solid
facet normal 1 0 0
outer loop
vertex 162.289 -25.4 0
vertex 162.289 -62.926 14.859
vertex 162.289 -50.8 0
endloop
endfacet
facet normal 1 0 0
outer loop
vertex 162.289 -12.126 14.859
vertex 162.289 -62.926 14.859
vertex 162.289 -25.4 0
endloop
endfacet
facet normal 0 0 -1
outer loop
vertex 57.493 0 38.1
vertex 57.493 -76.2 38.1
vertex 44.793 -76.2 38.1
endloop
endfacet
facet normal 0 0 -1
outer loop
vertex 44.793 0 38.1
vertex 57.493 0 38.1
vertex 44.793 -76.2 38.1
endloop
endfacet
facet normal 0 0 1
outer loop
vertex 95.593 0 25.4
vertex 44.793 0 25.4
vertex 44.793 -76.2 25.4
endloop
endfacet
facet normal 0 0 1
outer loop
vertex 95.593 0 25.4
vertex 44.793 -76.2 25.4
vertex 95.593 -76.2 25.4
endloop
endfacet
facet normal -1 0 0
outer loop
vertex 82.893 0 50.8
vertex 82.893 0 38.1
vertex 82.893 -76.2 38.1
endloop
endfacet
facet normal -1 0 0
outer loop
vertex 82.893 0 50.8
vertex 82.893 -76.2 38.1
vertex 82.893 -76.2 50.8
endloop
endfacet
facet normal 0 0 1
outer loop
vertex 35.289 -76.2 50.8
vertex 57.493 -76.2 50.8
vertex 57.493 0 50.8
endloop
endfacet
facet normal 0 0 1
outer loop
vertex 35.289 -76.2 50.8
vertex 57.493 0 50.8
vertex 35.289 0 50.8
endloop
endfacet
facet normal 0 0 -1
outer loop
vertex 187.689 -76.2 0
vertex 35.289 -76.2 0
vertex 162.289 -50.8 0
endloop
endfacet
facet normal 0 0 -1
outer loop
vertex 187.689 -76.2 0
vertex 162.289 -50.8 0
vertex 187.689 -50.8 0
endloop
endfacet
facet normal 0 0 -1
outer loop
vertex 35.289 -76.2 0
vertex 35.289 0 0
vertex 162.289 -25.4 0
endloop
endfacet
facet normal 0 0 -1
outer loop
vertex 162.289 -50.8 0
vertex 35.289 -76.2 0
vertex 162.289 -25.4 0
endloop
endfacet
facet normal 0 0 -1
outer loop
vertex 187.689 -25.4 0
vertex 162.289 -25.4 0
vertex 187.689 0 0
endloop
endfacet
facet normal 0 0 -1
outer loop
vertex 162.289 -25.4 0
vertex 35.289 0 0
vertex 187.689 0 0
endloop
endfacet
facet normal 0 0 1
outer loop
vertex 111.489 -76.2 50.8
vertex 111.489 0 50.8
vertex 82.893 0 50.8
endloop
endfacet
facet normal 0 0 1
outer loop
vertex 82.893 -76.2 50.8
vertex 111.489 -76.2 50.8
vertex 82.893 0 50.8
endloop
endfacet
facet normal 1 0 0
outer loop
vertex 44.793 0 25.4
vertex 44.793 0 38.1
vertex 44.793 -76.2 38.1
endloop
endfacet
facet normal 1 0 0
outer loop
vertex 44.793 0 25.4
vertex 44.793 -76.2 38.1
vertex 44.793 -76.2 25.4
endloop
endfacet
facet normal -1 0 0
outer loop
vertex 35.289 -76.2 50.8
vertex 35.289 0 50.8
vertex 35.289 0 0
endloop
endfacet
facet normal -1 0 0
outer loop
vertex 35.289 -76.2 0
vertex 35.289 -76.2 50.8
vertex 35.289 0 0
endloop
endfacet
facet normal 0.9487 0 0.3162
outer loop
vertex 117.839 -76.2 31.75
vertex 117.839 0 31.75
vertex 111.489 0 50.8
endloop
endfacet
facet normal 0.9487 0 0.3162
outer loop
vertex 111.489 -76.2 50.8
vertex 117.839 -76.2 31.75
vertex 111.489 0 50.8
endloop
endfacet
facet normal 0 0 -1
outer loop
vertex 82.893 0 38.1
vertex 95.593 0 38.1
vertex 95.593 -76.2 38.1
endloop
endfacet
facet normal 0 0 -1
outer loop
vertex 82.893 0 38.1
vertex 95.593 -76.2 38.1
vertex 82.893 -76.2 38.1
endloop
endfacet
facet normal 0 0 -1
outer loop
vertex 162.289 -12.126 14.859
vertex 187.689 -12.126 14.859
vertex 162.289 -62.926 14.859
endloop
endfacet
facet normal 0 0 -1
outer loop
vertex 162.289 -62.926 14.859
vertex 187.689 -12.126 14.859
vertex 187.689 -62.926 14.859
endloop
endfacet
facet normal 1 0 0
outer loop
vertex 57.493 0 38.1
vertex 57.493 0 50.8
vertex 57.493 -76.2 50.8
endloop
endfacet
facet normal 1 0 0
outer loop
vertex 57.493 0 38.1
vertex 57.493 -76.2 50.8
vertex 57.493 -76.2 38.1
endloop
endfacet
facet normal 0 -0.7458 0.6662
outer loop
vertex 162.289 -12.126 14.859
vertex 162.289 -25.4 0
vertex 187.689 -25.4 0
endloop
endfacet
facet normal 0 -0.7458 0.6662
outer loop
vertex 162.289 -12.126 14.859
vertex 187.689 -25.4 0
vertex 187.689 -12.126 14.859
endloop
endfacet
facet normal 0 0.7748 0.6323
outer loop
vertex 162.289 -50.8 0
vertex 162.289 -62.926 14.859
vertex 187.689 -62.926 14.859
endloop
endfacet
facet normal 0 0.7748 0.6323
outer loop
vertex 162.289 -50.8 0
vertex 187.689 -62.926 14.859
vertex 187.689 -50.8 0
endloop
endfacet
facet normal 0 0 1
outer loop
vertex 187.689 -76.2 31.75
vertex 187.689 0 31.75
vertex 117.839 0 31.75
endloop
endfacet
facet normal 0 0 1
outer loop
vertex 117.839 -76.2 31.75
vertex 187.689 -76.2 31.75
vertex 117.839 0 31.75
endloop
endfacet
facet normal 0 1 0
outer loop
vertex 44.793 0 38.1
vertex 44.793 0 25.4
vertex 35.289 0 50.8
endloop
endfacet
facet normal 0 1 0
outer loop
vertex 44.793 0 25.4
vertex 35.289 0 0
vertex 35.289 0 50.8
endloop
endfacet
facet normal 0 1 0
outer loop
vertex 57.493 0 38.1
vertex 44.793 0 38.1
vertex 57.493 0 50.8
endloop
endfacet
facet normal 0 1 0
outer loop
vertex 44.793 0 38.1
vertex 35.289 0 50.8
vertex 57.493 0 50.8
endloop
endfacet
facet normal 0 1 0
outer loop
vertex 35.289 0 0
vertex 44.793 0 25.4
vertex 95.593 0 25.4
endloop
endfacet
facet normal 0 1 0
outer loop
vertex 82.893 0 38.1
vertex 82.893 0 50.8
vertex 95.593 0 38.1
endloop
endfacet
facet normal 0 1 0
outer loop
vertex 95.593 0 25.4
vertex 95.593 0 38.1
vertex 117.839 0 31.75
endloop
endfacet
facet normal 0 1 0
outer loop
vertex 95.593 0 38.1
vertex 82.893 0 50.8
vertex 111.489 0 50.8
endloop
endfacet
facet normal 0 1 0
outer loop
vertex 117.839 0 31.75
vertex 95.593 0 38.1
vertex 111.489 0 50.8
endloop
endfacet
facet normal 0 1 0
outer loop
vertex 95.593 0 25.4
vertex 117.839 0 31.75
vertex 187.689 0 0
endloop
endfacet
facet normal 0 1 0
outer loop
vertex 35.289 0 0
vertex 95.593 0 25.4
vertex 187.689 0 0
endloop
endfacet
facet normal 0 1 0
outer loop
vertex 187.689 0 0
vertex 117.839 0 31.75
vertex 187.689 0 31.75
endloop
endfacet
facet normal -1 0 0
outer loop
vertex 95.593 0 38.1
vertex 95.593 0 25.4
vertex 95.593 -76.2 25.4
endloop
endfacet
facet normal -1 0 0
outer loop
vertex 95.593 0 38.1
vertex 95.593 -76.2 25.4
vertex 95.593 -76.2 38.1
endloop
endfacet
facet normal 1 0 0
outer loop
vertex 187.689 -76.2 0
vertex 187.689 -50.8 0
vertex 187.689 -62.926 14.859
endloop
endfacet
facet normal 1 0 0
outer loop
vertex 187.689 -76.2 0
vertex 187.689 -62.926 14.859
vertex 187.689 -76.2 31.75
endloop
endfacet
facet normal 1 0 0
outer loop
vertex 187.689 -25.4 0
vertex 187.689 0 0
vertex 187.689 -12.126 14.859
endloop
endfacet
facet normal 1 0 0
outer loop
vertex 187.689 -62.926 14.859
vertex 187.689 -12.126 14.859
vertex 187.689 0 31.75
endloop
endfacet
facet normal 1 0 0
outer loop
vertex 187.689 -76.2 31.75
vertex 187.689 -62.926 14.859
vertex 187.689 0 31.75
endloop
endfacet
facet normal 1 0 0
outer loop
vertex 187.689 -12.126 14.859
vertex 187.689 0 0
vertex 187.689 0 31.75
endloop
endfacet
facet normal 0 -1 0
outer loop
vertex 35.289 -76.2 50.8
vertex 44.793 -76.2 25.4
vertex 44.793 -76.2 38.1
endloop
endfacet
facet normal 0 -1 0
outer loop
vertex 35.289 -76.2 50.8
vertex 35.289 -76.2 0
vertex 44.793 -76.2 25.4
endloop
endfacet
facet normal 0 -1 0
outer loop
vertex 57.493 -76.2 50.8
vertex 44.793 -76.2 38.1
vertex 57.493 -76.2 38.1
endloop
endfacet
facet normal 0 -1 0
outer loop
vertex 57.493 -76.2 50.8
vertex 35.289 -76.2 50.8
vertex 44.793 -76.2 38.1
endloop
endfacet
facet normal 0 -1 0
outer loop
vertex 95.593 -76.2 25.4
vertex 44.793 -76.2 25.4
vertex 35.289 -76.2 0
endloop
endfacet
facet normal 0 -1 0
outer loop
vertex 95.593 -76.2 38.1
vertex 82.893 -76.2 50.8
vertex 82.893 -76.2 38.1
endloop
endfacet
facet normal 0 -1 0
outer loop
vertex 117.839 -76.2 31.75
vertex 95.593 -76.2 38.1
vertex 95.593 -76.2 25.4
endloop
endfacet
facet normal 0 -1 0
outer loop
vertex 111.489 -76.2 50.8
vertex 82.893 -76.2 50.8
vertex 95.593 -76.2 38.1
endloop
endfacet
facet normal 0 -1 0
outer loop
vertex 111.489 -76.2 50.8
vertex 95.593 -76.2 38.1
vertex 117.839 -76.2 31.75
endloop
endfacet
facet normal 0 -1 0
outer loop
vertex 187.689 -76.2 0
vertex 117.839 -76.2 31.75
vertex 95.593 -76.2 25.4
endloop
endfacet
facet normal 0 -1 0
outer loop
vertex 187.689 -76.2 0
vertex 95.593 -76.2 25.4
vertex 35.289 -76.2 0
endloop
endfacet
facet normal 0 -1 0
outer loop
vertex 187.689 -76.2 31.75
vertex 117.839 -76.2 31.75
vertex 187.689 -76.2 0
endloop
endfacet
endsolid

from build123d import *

# Parameters (mm, degrees)
F1_DEPTH = 76.2
F3_DEPTH = 76.2
F5_DEPTH = 25.4


with BuildPart() as f1:
    # F0 (on Front) → F1 (new body)
    with BuildSketch(Plane.XZ):
        Polygon((35.288685, 50.8), (35.288685, 0), (187.688685, 0), (187.688685, 31.75), (117.838685, 31.75), (111.488685, 50.8), align=None)
    extrude(amount=F1_DEPTH)

    # F2 (on face) → F3 (cut)
    with BuildSketch(Plane.XZ.offset(76.2)):
        Polygon((82.892604, 50.8), (57.492604, 50.8), (57.492604, 38.1), (44.792604, 38.1), (44.792604, 25.4), (95.592604, 25.4), (95.592604, 38.1), (82.892604, 38.1), align=None)
    extrude(amount=-F3_DEPTH, mode=Mode.SUBTRACT)

    # F4 (on face) → F5 (cut)
    with BuildSketch(Plane.YZ.offset(187.688685)):
        Polygon((-62.926312, 14.859), (-50.8, 0), (-25.4, 0), (-12.126312, 14.859), align=None)
    extrude(amount=-F5_DEPTH, mode=Mode.SUBTRACT)


solid = f1.part
